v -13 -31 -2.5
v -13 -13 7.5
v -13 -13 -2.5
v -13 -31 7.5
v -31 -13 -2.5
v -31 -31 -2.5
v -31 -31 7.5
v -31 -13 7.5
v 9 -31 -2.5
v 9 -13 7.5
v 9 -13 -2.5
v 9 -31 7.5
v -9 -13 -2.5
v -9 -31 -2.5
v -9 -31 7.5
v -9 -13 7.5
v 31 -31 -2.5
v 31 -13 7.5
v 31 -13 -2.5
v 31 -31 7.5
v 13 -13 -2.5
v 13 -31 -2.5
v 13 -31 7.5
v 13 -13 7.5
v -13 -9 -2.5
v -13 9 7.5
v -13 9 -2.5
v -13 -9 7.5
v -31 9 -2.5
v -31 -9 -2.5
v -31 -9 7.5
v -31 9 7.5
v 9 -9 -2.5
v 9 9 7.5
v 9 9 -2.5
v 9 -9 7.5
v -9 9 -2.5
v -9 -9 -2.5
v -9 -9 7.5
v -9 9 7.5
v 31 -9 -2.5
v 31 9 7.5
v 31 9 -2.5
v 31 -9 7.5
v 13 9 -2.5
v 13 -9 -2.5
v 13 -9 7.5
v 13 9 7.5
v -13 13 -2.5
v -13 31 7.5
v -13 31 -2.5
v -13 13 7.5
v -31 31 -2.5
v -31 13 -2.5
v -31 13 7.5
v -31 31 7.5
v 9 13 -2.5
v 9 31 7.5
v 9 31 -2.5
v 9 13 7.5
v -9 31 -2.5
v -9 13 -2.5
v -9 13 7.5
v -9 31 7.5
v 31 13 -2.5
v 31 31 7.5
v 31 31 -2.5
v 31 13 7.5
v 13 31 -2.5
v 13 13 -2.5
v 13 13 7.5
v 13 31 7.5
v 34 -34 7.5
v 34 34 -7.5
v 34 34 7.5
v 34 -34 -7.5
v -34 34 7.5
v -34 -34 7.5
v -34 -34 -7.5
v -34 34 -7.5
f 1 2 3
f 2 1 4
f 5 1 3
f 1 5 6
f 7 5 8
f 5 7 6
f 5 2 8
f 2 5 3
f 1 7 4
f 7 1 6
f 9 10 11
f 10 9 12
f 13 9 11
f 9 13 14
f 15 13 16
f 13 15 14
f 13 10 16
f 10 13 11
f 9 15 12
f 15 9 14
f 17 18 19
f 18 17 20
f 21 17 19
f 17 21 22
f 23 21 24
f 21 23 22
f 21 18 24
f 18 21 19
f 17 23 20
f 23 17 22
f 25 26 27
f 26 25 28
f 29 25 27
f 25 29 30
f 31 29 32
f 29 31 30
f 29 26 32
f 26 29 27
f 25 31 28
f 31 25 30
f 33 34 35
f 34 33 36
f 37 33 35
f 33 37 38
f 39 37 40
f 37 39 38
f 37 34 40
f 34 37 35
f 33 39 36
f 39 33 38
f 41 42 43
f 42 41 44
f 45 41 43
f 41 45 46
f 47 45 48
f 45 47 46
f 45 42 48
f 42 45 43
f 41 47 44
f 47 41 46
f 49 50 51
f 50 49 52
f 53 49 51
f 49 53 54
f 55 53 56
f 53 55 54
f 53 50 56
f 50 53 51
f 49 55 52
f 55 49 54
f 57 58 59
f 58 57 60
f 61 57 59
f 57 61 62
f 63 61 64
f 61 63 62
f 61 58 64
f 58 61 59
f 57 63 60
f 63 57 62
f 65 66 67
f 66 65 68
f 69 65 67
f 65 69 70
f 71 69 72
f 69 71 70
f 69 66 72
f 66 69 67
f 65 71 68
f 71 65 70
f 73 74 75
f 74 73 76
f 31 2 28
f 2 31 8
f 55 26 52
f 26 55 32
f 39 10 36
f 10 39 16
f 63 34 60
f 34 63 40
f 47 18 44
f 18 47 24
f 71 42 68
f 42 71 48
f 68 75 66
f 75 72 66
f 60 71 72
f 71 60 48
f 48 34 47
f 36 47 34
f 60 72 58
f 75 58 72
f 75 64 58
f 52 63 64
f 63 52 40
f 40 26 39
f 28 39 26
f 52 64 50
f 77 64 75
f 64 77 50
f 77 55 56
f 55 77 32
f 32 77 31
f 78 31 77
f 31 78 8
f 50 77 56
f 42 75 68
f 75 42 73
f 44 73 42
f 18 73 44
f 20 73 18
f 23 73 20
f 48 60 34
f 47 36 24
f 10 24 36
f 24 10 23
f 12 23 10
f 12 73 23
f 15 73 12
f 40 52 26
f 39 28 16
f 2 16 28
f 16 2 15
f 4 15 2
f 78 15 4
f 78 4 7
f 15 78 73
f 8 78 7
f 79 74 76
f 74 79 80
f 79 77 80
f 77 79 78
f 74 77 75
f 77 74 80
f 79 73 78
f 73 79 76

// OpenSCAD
$fn = 32;

// ----------------------------------------------------------------------
// Pocket plate 68 x 68 x 15
// 3 x 3 pockets 18 mm square, 10 mm deep
// ----------------------------------------------------------------------

// --- parameters (mm) ---
thickness = 15;  // plate thickness
floor_t = 5;     // material left under each pocket
pocket = 18;     // pocket side length
pitch_x = 22;    // pocket pitch along X
pitch_y = 22;    // pocket pitch along Y
cols = 3;        // pockets per row
rows = 3;        // rows of pockets

// --- derived feature positions (mm) ---
depth = thickness - floor_t;        // = 10   pocket depth, down to the floor
span_x = (cols - 1) * pitch_x;      // = 44   distance between outer pockets
span_y = (rows - 1) * pitch_y;      // = 44   distance between outer pocket rows
origin_x = -span_x / 2;             // = -22   X of the first pocket
origin_y = -span_y / 2;             // = -22   Y of the first pocket
plate = [span_x + pocket + 6, span_y + pocket + 6, thickness];  // = [68, 68, 15]   overall size: pockets plus 3 mm of wall on each side
feature_centers = [
  [origin_x + 0 * pitch_x, origin_y + 0 * pitch_y],
  [origin_x + 1 * pitch_x, origin_y + 0 * pitch_y],
  [origin_x + 2 * pitch_x, origin_y + 0 * pitch_y],
  [origin_x + 0 * pitch_x, origin_y + 1 * pitch_y],
  [origin_x + 1 * pitch_x, origin_y + 1 * pitch_y],
  [origin_x + 2 * pitch_x, origin_y + 1 * pitch_y],
  [origin_x + 0 * pitch_x, origin_y + 2 * pitch_y],
  [origin_x + 1 * pitch_x, origin_y + 2 * pitch_y],
  [origin_x + 2 * pitch_x, origin_y + 2 * pitch_y]
];   // pocket centres, used verbatim by the cutter loop

// plate outline, then one pocket per centre in feature_centers
difference() {
  cube(plate, center = true);
  for (centre = feature_centers)
    translate([centre[0] - pocket / 2, centre[1] - pocket / 2, plate[2] / 2 - depth])
      cube([pocket, pocket, depth + 1]);  // centred on the declared pocket centre
}
